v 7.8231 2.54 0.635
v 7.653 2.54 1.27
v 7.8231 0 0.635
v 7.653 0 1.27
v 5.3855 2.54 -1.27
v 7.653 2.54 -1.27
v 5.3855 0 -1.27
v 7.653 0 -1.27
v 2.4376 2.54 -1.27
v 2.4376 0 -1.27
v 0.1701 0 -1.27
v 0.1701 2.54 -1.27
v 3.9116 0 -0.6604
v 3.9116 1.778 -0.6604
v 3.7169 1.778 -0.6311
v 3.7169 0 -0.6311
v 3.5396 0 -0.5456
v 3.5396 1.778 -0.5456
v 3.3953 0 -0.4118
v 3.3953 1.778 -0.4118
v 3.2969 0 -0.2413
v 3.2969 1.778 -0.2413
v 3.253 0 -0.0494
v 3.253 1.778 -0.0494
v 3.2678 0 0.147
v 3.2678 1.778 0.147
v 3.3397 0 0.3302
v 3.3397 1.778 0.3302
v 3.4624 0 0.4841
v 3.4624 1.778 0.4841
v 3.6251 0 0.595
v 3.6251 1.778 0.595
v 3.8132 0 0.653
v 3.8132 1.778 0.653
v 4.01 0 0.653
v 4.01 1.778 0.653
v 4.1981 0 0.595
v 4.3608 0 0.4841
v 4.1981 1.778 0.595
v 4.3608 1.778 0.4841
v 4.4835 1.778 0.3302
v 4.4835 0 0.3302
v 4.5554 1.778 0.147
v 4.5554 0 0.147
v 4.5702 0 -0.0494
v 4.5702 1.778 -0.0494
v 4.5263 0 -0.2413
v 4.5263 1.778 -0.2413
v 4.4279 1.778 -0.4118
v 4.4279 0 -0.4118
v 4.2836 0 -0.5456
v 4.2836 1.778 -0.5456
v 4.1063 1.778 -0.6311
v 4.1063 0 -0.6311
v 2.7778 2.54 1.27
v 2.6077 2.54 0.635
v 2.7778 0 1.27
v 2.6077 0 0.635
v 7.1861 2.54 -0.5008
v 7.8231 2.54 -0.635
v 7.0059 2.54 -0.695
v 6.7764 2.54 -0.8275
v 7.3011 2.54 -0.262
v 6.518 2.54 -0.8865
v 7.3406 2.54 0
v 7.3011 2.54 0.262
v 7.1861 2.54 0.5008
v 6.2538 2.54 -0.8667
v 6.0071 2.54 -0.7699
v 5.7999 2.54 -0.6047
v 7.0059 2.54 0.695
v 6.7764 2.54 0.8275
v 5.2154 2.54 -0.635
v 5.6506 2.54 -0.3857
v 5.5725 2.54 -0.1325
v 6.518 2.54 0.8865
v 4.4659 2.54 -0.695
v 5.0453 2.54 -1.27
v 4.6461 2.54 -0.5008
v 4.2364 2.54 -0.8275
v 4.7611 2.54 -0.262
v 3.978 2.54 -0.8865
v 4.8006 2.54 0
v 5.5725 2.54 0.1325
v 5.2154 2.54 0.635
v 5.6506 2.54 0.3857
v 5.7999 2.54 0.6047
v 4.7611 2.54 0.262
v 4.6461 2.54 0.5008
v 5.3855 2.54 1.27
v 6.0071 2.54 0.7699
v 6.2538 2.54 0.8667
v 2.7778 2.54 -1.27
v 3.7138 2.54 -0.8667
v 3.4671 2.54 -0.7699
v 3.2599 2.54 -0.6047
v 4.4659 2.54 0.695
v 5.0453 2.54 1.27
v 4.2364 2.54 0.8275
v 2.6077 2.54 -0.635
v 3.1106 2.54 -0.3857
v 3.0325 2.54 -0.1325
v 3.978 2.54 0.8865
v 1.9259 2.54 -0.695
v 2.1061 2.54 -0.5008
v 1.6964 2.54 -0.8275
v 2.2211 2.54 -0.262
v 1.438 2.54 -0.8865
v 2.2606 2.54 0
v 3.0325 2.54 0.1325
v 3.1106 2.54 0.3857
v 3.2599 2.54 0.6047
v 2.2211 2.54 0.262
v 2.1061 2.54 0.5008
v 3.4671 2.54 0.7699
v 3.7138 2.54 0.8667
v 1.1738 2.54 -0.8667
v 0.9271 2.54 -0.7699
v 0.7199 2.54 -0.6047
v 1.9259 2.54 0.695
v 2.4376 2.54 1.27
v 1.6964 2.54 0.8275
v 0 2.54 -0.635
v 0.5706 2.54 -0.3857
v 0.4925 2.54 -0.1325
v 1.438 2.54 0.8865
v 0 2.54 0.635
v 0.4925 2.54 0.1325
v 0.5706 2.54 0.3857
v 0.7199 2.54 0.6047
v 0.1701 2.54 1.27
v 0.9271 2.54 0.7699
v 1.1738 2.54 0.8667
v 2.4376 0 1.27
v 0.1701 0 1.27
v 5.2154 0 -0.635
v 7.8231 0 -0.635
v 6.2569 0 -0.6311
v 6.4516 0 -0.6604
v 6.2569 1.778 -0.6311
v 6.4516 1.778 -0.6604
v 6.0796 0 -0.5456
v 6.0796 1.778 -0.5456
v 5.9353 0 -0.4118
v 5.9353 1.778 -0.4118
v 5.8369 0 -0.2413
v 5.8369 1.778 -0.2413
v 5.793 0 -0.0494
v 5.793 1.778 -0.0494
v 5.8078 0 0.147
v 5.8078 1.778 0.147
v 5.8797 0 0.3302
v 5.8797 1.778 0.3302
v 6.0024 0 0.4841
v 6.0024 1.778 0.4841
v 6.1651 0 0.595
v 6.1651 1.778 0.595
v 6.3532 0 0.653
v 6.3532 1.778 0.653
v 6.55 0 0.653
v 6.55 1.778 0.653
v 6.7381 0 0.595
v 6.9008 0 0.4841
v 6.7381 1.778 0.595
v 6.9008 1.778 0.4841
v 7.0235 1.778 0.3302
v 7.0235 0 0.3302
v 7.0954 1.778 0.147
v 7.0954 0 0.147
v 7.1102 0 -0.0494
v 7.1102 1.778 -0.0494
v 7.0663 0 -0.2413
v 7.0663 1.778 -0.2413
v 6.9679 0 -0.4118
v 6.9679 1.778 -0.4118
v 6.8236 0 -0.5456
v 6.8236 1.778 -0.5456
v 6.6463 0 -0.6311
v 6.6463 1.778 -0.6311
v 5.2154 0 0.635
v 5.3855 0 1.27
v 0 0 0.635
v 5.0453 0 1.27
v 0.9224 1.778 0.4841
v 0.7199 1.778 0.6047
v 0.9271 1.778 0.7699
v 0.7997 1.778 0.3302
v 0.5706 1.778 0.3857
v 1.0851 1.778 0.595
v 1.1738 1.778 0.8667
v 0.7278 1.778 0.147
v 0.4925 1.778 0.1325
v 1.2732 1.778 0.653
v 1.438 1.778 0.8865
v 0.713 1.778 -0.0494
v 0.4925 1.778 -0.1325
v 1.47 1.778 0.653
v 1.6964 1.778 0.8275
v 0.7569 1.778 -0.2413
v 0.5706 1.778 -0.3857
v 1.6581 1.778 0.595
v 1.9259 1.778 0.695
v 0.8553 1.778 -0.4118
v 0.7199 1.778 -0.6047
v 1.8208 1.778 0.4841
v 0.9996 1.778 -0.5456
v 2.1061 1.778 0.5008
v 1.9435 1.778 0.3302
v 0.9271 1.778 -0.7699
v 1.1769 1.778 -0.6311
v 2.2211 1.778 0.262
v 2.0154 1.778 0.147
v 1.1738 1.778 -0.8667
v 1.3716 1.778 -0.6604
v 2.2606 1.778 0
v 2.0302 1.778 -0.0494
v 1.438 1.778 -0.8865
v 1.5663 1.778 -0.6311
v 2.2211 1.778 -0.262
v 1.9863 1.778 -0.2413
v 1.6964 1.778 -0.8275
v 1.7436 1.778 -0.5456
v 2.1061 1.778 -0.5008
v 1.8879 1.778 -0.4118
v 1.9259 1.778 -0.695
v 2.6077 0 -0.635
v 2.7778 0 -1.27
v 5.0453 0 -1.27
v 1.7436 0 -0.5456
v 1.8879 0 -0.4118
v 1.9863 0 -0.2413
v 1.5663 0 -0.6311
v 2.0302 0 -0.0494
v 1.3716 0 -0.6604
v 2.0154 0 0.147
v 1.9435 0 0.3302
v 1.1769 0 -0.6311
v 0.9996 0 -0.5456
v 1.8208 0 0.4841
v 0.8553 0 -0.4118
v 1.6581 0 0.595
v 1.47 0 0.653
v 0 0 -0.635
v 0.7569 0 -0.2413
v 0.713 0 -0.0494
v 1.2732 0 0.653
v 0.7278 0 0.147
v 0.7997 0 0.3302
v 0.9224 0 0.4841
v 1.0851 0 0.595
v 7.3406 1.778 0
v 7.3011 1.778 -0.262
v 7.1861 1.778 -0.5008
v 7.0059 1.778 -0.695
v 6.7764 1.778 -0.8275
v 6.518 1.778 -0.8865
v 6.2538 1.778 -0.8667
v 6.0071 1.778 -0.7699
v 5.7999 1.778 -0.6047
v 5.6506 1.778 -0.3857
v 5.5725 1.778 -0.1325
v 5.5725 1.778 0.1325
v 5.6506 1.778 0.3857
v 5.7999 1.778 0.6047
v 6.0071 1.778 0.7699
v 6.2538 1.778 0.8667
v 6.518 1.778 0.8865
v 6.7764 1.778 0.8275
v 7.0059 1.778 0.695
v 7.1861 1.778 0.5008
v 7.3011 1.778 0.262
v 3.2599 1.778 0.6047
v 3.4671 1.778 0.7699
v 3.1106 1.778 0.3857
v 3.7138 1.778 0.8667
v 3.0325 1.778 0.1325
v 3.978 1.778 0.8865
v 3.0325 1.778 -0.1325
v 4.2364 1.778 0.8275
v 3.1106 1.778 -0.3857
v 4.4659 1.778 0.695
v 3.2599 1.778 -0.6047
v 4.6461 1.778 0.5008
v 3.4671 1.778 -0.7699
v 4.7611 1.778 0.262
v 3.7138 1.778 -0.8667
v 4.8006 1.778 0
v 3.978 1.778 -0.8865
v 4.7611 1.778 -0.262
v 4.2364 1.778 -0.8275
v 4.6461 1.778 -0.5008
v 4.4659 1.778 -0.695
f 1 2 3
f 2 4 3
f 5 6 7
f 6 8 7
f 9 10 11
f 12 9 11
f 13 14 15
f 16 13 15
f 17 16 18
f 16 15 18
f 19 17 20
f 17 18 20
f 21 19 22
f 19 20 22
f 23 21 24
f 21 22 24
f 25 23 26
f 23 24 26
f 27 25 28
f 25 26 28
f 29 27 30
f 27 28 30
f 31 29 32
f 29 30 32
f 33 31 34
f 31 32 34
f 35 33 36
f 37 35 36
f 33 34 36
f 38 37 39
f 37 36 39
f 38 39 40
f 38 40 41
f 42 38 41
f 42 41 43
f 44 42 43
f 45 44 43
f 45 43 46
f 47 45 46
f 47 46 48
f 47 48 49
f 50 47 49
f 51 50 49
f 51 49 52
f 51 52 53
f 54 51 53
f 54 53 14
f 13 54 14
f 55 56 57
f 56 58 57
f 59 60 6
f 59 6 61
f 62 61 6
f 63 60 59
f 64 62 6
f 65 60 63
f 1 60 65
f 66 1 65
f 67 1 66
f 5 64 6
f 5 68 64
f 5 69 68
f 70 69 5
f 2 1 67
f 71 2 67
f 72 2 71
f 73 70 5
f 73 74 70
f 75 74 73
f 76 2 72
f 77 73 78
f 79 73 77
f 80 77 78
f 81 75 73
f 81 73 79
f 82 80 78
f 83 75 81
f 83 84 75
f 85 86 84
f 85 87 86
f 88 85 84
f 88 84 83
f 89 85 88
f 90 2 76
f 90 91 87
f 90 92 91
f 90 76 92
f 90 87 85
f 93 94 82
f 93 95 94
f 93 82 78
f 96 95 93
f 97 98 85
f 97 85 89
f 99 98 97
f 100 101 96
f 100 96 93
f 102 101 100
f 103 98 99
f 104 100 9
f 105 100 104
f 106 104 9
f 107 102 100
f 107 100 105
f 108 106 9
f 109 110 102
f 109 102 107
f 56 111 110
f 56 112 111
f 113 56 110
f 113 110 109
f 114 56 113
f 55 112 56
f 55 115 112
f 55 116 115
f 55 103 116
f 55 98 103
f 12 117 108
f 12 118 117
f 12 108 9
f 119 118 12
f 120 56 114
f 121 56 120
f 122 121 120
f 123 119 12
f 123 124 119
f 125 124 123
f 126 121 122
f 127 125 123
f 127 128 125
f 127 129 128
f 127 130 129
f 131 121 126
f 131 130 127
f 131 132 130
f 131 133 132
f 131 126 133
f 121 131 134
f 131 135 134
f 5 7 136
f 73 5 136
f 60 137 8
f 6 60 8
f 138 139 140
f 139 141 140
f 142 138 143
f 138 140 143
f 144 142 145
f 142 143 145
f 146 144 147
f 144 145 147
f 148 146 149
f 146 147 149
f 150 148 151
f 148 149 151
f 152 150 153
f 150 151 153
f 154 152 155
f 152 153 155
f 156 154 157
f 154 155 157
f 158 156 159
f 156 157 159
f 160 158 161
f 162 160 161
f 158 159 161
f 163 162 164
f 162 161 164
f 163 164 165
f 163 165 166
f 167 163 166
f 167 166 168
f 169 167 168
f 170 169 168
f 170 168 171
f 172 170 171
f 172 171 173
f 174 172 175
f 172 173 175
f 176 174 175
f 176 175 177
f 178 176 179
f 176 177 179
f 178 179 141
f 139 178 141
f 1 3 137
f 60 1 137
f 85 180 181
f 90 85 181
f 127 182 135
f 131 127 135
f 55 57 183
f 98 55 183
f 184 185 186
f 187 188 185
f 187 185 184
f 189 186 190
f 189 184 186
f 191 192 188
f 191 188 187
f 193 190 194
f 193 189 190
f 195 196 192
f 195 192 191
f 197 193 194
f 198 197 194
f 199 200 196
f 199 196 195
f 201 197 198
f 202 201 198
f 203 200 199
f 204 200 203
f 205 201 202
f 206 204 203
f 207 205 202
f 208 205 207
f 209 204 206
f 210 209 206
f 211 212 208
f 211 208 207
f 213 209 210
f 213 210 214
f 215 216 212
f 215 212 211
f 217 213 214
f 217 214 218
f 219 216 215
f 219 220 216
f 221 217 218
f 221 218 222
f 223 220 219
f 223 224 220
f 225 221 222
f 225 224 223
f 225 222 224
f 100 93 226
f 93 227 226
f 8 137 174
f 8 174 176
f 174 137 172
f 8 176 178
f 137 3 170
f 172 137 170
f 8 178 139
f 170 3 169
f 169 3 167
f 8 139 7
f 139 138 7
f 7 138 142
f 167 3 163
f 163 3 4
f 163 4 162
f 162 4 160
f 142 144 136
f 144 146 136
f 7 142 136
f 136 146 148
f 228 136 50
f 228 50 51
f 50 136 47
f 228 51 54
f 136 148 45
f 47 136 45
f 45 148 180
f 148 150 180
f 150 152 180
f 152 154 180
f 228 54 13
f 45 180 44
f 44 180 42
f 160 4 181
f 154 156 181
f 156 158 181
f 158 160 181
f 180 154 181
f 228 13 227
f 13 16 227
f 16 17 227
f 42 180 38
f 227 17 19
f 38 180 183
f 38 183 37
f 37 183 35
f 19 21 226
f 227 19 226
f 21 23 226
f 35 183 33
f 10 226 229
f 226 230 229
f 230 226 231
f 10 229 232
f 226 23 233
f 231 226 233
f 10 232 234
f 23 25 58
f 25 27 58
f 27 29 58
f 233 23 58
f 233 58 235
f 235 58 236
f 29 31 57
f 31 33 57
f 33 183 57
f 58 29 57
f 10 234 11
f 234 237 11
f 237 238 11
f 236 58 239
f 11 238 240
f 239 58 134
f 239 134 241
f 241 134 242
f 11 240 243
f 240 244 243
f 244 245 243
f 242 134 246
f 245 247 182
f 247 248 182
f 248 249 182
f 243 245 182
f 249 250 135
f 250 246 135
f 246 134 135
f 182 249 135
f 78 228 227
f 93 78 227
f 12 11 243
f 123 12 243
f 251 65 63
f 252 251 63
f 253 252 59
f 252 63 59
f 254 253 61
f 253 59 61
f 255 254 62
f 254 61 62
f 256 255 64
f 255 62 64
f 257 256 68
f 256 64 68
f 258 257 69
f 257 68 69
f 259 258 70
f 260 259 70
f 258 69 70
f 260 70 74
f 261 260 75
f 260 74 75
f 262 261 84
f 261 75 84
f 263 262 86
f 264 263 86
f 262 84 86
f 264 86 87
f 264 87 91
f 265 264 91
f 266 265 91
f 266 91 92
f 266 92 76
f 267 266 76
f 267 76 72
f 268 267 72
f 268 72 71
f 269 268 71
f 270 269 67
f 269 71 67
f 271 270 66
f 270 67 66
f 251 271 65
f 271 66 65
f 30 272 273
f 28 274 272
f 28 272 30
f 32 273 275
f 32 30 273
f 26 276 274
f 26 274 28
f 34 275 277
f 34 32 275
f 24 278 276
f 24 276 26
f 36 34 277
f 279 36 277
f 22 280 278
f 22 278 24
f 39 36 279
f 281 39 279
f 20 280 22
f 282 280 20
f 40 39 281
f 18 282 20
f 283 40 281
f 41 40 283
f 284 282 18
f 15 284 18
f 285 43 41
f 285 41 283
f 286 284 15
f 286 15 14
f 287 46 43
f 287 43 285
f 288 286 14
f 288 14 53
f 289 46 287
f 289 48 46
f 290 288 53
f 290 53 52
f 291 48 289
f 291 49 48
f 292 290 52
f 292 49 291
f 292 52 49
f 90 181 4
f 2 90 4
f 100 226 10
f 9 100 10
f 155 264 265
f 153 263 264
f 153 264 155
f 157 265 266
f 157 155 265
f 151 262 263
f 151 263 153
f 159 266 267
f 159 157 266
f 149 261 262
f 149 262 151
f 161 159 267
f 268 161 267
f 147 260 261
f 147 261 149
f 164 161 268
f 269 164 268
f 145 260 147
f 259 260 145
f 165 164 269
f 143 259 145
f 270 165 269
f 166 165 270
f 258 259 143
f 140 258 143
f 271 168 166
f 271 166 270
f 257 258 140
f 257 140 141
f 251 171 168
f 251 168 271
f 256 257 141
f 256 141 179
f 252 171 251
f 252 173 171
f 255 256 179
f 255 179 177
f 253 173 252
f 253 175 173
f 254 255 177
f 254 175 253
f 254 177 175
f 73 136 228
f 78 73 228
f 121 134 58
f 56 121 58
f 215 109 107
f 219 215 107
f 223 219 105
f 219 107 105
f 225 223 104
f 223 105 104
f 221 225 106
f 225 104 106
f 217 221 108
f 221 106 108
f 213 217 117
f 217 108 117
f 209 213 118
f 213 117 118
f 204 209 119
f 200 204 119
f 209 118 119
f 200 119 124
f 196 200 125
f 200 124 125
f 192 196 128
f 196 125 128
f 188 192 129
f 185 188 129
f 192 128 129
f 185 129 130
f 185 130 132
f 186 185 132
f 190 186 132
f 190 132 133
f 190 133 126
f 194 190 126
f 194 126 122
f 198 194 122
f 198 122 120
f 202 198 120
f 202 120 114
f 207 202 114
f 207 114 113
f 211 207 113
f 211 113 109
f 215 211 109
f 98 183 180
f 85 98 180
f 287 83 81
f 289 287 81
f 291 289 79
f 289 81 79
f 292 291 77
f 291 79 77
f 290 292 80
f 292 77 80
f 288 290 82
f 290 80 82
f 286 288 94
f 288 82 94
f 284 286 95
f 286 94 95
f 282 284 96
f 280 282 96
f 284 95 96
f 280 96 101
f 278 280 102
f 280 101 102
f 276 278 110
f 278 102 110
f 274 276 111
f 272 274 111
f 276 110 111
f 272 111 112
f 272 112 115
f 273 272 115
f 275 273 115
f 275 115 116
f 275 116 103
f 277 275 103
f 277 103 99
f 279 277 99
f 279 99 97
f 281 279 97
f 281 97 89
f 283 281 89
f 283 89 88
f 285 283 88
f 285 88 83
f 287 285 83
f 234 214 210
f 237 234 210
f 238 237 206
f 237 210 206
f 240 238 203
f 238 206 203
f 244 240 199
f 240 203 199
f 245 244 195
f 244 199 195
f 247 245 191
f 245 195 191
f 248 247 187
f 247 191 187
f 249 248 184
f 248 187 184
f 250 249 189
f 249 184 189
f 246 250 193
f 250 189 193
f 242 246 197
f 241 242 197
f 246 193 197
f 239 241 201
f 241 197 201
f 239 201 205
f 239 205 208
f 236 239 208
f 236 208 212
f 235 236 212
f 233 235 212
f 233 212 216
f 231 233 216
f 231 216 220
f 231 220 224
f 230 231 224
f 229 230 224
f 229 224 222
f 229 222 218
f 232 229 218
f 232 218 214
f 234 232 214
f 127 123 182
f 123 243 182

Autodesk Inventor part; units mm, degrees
sketch "Sketch_17" plane through (0, 0, 0) normal (0, 1, 0) x (-1, 0, 0)
  line L0 (-0.254, -0.635) -> (-0.254, 0.635)
  line L1 (-0.254, 0.635) -> (-7.5692, 0.635)
  line L2 (-7.5692, 0.635) -> (-7.5692, -0.635)
  line L3 (-7.5692, -0.635) -> (-0.254, -0.635)
extrude "Extrusion1" add sketch "Sketch_17" along normal blind 2.54
sketch "Sketch_3" plane through (0, 0, 0) normal (0, 1, 0) x (-1, 0, 0)
  line L0 (0, 0.635) -> (-0.1701, 1.27)
  line L1 (-0.1701, 1.27) -> (-2.4376, 1.27)
  line L2 (-2.4376, 1.27) -> (-2.6077, 0.635)
  line L3 (-2.6077, 0.635) -> (-2.6077, -0.635)
  line L4 (-2.6077, -0.635) -> (-2.4376, -1.27)
  line L5 (-2.4376, -1.27) -> (-0.1701, -1.27)
  line L6 (-0.1701, -1.27) -> (0, -0.635)
  line L7 (0, -0.635) -> (0, 0.635)
extrude "Extrusion2" add sketch "Sketch_3" along normal blind 2.54
pattern_linear "Rectangular Pattern1" count 3 spacing 2.6077 along (1, 0, 0) of "Extrusion2"
sketch "Sketch3" plane through (0, 0, 0) normal (0, -1, 0) x (1, 0, 0)
  point P0 (1.3716, 0)
hole "Hole1" at (1.3716, 0, 0) direction (0, 1, 0) diameter 1.3208 depth 2.54
pattern_linear "Rectangular Pattern2" count 3 spacing 2.54 along (1, 0, 0) of "Hole1"
sketch "Sketch_7" plane through (0, 2.54, 0) normal (0, 1, 0) x (1, 0, 0)
  circle A0 centre (1.3716, 0) radius 0.889
extrude "Extrusion3" cut sketch "Sketch_7" against normal blind 0.762
pattern_linear "Rectangular Pattern3" count 3 spacing 2.54 along (1, 0, 0) of "Extrusion3"
ref_plane "socket_XY" through (3.9116, 0, 0) normal (0, 1, 0) x (1, 0, 0)
ref_plane "socket_YZ" through (3.9116, 0, 0) normal (1, 0, 0) x (0, 0, -1)
ref_plane "socket_ZX" through (3.9116, 0, 0) normal (0, 0, -1) x (0, 1, 0)
ref_plane "to_pin_1_XY" through (1.3716, 2.7432, 0) normal (0, 1, 0) x (1, 0, 0)
ref_plane "to_pin_1_YZ" through (1.3716, 2.7432, 0) normal (1, 0, 0) x (0, 0, -1)
ref_plane "to_pin_1_ZX" through (1.3716, 2.7432, 0) normal (0, 0, -1) x (0, 1, 0)
ref_plane "to_pin_2_XY" through (3.9116, 2.7432, 0) normal (0, 1, 0) x (1, 0, 0)
ref_plane "to_pin_2_YZ" through (3.9116, 2.7432, 0) normal (1, 0, 0) x (0, 0, -1)
ref_plane "to_pin_2_ZX" through (3.9116, 2.7432, 0) normal (0, 0, -1) x (0, 1, 0)
ref_plane "to_pin_3_XY" through (6.4516, 2.7432, 0) normal (0, 1, 0) x (1, 0, 0)
ref_plane "to_pin_3_YZ" through (6.4516, 2.7432, 0) normal (1, 0, 0) x (0, 0, -1)
ref_plane "to_pin_3_ZX" through (6.4516, 2.7432, 0) normal (0, 0, -1) x (0, 1, 0)
ref_plane "to_pin2_1_XY" through (1.3716, 2.7432, 0) normal (0, 1, 0) x (1, 0, 0)
ref_plane "to_pin2_1_YZ" through (1.3716, 2.7432, 0) normal (1, 0, 0) x (0, 0, -1)
ref_plane "to_pin2_1_ZX" through (1.3716, 2.7432, 0) normal (0, 0, -1) x (0, 1, 0)
ref_plane "to_pin2_2_XY" through (3.9116, 2.7432, 0) normal (0, 1, 0) x (1, 0, 0)
ref_plane "to_pin2_2_YZ" through (3.9116, 2.7432, 0) normal (1, 0, 0) x (0, 0, -1)
ref_plane "to_pin2_2_ZX" through (3.9116, 2.7432, 0) normal (0, 0, -1) x (0, 1, 0)
ref_plane "to_pin2_3_XY" through (6.4516, 2.7432, 0) normal (0, 1, 0) x (1, 0, 0)
ref_plane "to_pin2_3_YZ" through (6.4516, 2.7432, 0) normal (1, 0, 0) x (0, 0, -1)
ref_plane "to_pin2_3_ZX" through (6.4516, 2.7432, 0) normal (0, 0, -1) x (0, 1, 0)
properties part number "TS-103-G-A_socket"
